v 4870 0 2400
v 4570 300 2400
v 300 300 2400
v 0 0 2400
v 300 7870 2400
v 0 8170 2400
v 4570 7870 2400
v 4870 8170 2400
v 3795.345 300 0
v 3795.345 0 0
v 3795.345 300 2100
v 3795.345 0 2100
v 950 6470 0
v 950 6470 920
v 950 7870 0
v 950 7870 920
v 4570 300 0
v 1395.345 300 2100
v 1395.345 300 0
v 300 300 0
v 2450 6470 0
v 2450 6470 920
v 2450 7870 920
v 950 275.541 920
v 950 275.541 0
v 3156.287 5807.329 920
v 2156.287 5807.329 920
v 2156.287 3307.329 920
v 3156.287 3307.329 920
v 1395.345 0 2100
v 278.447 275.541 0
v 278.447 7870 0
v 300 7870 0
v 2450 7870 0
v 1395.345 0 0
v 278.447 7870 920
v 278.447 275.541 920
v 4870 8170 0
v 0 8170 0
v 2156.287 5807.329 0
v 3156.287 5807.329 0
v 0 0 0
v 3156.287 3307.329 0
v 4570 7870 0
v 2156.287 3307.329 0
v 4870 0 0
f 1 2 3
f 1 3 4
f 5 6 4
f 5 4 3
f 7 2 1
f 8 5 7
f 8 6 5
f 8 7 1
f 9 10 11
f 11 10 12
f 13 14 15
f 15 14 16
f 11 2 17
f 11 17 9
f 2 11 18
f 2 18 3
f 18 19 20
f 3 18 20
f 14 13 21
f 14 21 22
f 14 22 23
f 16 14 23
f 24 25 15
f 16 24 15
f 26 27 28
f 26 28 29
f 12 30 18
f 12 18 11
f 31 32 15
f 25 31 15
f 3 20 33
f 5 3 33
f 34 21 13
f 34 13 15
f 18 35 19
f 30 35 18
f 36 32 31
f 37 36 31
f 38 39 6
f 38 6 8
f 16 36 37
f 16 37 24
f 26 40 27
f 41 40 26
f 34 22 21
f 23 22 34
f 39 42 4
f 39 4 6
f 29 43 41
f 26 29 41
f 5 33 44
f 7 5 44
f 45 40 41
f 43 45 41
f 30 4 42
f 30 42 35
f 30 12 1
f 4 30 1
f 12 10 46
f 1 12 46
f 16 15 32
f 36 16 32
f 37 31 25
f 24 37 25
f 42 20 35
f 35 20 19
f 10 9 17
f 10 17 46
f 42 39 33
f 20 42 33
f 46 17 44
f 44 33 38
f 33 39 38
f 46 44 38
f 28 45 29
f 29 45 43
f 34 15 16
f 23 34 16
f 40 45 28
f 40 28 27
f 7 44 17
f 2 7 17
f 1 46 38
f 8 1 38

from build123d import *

# Parameters (mm, degrees)
F0_W     = 4870
F0_H     = 8170
F1_DEPTH = 2400
F3_DEPTH = 920
F4_W     = 2400
F4_H     = 2100
F5_DEPTH = 510
F6_W     = 1000
F6_H     = 2500
F7_DEPTH = 920
F8_W     = 1400
F8_H     = 920
F9_DEPTH = 1500


with BuildPart() as f1:
    # F0 (on Top) → F1 (new body)
    with BuildSketch(Plane.XY):
        with Locations((2435, 4085)):
            Rectangle(F0_W, F0_H)
        Polygon((300, 300), (300, 7870), (950, 7870), (4570, 7870), (4570, 300), align=None, mode=Mode.SUBTRACT)
    extrude(amount=F1_DEPTH)

    # F4 (on face) → F5 (cut)
    with BuildSketch(Plane.XZ):
        with Locations((2595.344734, 1050)):
            Rectangle(F4_W, F4_H)
    extrude(amount=-F5_DEPTH, mode=Mode.SUBTRACT)


with BuildPart() as f3:
    # F2 (on Top) → F3 (new body)
    with BuildSketch(Plane.XY):
        Polygon((950, 651.986386), (950, 7870), (278.446525, 7870), (278.446525, 275.54065), (950, 275.54065), align=None)
    extrude(amount=F3_DEPTH)


with BuildPart() as f7:
    # F6 (on Top) → F7 (new body)
    with BuildSketch(Plane.XY):
        with Locations((2656.287205, 4557.328731)):
            Rectangle(F6_W, F6_H)
    extrude(amount=F7_DEPTH)


with BuildPart() as f9:
    # F8 (on face) → F9 (new body)
    with BuildSketch(Plane.YZ.offset(950)):
        with Locations((7170, 460)):
            Rectangle(F8_W, F8_H)
    extrude(amount=F9_DEPTH)


solid = Compound([f1.part, f3.part, f7.part, f9.part])
